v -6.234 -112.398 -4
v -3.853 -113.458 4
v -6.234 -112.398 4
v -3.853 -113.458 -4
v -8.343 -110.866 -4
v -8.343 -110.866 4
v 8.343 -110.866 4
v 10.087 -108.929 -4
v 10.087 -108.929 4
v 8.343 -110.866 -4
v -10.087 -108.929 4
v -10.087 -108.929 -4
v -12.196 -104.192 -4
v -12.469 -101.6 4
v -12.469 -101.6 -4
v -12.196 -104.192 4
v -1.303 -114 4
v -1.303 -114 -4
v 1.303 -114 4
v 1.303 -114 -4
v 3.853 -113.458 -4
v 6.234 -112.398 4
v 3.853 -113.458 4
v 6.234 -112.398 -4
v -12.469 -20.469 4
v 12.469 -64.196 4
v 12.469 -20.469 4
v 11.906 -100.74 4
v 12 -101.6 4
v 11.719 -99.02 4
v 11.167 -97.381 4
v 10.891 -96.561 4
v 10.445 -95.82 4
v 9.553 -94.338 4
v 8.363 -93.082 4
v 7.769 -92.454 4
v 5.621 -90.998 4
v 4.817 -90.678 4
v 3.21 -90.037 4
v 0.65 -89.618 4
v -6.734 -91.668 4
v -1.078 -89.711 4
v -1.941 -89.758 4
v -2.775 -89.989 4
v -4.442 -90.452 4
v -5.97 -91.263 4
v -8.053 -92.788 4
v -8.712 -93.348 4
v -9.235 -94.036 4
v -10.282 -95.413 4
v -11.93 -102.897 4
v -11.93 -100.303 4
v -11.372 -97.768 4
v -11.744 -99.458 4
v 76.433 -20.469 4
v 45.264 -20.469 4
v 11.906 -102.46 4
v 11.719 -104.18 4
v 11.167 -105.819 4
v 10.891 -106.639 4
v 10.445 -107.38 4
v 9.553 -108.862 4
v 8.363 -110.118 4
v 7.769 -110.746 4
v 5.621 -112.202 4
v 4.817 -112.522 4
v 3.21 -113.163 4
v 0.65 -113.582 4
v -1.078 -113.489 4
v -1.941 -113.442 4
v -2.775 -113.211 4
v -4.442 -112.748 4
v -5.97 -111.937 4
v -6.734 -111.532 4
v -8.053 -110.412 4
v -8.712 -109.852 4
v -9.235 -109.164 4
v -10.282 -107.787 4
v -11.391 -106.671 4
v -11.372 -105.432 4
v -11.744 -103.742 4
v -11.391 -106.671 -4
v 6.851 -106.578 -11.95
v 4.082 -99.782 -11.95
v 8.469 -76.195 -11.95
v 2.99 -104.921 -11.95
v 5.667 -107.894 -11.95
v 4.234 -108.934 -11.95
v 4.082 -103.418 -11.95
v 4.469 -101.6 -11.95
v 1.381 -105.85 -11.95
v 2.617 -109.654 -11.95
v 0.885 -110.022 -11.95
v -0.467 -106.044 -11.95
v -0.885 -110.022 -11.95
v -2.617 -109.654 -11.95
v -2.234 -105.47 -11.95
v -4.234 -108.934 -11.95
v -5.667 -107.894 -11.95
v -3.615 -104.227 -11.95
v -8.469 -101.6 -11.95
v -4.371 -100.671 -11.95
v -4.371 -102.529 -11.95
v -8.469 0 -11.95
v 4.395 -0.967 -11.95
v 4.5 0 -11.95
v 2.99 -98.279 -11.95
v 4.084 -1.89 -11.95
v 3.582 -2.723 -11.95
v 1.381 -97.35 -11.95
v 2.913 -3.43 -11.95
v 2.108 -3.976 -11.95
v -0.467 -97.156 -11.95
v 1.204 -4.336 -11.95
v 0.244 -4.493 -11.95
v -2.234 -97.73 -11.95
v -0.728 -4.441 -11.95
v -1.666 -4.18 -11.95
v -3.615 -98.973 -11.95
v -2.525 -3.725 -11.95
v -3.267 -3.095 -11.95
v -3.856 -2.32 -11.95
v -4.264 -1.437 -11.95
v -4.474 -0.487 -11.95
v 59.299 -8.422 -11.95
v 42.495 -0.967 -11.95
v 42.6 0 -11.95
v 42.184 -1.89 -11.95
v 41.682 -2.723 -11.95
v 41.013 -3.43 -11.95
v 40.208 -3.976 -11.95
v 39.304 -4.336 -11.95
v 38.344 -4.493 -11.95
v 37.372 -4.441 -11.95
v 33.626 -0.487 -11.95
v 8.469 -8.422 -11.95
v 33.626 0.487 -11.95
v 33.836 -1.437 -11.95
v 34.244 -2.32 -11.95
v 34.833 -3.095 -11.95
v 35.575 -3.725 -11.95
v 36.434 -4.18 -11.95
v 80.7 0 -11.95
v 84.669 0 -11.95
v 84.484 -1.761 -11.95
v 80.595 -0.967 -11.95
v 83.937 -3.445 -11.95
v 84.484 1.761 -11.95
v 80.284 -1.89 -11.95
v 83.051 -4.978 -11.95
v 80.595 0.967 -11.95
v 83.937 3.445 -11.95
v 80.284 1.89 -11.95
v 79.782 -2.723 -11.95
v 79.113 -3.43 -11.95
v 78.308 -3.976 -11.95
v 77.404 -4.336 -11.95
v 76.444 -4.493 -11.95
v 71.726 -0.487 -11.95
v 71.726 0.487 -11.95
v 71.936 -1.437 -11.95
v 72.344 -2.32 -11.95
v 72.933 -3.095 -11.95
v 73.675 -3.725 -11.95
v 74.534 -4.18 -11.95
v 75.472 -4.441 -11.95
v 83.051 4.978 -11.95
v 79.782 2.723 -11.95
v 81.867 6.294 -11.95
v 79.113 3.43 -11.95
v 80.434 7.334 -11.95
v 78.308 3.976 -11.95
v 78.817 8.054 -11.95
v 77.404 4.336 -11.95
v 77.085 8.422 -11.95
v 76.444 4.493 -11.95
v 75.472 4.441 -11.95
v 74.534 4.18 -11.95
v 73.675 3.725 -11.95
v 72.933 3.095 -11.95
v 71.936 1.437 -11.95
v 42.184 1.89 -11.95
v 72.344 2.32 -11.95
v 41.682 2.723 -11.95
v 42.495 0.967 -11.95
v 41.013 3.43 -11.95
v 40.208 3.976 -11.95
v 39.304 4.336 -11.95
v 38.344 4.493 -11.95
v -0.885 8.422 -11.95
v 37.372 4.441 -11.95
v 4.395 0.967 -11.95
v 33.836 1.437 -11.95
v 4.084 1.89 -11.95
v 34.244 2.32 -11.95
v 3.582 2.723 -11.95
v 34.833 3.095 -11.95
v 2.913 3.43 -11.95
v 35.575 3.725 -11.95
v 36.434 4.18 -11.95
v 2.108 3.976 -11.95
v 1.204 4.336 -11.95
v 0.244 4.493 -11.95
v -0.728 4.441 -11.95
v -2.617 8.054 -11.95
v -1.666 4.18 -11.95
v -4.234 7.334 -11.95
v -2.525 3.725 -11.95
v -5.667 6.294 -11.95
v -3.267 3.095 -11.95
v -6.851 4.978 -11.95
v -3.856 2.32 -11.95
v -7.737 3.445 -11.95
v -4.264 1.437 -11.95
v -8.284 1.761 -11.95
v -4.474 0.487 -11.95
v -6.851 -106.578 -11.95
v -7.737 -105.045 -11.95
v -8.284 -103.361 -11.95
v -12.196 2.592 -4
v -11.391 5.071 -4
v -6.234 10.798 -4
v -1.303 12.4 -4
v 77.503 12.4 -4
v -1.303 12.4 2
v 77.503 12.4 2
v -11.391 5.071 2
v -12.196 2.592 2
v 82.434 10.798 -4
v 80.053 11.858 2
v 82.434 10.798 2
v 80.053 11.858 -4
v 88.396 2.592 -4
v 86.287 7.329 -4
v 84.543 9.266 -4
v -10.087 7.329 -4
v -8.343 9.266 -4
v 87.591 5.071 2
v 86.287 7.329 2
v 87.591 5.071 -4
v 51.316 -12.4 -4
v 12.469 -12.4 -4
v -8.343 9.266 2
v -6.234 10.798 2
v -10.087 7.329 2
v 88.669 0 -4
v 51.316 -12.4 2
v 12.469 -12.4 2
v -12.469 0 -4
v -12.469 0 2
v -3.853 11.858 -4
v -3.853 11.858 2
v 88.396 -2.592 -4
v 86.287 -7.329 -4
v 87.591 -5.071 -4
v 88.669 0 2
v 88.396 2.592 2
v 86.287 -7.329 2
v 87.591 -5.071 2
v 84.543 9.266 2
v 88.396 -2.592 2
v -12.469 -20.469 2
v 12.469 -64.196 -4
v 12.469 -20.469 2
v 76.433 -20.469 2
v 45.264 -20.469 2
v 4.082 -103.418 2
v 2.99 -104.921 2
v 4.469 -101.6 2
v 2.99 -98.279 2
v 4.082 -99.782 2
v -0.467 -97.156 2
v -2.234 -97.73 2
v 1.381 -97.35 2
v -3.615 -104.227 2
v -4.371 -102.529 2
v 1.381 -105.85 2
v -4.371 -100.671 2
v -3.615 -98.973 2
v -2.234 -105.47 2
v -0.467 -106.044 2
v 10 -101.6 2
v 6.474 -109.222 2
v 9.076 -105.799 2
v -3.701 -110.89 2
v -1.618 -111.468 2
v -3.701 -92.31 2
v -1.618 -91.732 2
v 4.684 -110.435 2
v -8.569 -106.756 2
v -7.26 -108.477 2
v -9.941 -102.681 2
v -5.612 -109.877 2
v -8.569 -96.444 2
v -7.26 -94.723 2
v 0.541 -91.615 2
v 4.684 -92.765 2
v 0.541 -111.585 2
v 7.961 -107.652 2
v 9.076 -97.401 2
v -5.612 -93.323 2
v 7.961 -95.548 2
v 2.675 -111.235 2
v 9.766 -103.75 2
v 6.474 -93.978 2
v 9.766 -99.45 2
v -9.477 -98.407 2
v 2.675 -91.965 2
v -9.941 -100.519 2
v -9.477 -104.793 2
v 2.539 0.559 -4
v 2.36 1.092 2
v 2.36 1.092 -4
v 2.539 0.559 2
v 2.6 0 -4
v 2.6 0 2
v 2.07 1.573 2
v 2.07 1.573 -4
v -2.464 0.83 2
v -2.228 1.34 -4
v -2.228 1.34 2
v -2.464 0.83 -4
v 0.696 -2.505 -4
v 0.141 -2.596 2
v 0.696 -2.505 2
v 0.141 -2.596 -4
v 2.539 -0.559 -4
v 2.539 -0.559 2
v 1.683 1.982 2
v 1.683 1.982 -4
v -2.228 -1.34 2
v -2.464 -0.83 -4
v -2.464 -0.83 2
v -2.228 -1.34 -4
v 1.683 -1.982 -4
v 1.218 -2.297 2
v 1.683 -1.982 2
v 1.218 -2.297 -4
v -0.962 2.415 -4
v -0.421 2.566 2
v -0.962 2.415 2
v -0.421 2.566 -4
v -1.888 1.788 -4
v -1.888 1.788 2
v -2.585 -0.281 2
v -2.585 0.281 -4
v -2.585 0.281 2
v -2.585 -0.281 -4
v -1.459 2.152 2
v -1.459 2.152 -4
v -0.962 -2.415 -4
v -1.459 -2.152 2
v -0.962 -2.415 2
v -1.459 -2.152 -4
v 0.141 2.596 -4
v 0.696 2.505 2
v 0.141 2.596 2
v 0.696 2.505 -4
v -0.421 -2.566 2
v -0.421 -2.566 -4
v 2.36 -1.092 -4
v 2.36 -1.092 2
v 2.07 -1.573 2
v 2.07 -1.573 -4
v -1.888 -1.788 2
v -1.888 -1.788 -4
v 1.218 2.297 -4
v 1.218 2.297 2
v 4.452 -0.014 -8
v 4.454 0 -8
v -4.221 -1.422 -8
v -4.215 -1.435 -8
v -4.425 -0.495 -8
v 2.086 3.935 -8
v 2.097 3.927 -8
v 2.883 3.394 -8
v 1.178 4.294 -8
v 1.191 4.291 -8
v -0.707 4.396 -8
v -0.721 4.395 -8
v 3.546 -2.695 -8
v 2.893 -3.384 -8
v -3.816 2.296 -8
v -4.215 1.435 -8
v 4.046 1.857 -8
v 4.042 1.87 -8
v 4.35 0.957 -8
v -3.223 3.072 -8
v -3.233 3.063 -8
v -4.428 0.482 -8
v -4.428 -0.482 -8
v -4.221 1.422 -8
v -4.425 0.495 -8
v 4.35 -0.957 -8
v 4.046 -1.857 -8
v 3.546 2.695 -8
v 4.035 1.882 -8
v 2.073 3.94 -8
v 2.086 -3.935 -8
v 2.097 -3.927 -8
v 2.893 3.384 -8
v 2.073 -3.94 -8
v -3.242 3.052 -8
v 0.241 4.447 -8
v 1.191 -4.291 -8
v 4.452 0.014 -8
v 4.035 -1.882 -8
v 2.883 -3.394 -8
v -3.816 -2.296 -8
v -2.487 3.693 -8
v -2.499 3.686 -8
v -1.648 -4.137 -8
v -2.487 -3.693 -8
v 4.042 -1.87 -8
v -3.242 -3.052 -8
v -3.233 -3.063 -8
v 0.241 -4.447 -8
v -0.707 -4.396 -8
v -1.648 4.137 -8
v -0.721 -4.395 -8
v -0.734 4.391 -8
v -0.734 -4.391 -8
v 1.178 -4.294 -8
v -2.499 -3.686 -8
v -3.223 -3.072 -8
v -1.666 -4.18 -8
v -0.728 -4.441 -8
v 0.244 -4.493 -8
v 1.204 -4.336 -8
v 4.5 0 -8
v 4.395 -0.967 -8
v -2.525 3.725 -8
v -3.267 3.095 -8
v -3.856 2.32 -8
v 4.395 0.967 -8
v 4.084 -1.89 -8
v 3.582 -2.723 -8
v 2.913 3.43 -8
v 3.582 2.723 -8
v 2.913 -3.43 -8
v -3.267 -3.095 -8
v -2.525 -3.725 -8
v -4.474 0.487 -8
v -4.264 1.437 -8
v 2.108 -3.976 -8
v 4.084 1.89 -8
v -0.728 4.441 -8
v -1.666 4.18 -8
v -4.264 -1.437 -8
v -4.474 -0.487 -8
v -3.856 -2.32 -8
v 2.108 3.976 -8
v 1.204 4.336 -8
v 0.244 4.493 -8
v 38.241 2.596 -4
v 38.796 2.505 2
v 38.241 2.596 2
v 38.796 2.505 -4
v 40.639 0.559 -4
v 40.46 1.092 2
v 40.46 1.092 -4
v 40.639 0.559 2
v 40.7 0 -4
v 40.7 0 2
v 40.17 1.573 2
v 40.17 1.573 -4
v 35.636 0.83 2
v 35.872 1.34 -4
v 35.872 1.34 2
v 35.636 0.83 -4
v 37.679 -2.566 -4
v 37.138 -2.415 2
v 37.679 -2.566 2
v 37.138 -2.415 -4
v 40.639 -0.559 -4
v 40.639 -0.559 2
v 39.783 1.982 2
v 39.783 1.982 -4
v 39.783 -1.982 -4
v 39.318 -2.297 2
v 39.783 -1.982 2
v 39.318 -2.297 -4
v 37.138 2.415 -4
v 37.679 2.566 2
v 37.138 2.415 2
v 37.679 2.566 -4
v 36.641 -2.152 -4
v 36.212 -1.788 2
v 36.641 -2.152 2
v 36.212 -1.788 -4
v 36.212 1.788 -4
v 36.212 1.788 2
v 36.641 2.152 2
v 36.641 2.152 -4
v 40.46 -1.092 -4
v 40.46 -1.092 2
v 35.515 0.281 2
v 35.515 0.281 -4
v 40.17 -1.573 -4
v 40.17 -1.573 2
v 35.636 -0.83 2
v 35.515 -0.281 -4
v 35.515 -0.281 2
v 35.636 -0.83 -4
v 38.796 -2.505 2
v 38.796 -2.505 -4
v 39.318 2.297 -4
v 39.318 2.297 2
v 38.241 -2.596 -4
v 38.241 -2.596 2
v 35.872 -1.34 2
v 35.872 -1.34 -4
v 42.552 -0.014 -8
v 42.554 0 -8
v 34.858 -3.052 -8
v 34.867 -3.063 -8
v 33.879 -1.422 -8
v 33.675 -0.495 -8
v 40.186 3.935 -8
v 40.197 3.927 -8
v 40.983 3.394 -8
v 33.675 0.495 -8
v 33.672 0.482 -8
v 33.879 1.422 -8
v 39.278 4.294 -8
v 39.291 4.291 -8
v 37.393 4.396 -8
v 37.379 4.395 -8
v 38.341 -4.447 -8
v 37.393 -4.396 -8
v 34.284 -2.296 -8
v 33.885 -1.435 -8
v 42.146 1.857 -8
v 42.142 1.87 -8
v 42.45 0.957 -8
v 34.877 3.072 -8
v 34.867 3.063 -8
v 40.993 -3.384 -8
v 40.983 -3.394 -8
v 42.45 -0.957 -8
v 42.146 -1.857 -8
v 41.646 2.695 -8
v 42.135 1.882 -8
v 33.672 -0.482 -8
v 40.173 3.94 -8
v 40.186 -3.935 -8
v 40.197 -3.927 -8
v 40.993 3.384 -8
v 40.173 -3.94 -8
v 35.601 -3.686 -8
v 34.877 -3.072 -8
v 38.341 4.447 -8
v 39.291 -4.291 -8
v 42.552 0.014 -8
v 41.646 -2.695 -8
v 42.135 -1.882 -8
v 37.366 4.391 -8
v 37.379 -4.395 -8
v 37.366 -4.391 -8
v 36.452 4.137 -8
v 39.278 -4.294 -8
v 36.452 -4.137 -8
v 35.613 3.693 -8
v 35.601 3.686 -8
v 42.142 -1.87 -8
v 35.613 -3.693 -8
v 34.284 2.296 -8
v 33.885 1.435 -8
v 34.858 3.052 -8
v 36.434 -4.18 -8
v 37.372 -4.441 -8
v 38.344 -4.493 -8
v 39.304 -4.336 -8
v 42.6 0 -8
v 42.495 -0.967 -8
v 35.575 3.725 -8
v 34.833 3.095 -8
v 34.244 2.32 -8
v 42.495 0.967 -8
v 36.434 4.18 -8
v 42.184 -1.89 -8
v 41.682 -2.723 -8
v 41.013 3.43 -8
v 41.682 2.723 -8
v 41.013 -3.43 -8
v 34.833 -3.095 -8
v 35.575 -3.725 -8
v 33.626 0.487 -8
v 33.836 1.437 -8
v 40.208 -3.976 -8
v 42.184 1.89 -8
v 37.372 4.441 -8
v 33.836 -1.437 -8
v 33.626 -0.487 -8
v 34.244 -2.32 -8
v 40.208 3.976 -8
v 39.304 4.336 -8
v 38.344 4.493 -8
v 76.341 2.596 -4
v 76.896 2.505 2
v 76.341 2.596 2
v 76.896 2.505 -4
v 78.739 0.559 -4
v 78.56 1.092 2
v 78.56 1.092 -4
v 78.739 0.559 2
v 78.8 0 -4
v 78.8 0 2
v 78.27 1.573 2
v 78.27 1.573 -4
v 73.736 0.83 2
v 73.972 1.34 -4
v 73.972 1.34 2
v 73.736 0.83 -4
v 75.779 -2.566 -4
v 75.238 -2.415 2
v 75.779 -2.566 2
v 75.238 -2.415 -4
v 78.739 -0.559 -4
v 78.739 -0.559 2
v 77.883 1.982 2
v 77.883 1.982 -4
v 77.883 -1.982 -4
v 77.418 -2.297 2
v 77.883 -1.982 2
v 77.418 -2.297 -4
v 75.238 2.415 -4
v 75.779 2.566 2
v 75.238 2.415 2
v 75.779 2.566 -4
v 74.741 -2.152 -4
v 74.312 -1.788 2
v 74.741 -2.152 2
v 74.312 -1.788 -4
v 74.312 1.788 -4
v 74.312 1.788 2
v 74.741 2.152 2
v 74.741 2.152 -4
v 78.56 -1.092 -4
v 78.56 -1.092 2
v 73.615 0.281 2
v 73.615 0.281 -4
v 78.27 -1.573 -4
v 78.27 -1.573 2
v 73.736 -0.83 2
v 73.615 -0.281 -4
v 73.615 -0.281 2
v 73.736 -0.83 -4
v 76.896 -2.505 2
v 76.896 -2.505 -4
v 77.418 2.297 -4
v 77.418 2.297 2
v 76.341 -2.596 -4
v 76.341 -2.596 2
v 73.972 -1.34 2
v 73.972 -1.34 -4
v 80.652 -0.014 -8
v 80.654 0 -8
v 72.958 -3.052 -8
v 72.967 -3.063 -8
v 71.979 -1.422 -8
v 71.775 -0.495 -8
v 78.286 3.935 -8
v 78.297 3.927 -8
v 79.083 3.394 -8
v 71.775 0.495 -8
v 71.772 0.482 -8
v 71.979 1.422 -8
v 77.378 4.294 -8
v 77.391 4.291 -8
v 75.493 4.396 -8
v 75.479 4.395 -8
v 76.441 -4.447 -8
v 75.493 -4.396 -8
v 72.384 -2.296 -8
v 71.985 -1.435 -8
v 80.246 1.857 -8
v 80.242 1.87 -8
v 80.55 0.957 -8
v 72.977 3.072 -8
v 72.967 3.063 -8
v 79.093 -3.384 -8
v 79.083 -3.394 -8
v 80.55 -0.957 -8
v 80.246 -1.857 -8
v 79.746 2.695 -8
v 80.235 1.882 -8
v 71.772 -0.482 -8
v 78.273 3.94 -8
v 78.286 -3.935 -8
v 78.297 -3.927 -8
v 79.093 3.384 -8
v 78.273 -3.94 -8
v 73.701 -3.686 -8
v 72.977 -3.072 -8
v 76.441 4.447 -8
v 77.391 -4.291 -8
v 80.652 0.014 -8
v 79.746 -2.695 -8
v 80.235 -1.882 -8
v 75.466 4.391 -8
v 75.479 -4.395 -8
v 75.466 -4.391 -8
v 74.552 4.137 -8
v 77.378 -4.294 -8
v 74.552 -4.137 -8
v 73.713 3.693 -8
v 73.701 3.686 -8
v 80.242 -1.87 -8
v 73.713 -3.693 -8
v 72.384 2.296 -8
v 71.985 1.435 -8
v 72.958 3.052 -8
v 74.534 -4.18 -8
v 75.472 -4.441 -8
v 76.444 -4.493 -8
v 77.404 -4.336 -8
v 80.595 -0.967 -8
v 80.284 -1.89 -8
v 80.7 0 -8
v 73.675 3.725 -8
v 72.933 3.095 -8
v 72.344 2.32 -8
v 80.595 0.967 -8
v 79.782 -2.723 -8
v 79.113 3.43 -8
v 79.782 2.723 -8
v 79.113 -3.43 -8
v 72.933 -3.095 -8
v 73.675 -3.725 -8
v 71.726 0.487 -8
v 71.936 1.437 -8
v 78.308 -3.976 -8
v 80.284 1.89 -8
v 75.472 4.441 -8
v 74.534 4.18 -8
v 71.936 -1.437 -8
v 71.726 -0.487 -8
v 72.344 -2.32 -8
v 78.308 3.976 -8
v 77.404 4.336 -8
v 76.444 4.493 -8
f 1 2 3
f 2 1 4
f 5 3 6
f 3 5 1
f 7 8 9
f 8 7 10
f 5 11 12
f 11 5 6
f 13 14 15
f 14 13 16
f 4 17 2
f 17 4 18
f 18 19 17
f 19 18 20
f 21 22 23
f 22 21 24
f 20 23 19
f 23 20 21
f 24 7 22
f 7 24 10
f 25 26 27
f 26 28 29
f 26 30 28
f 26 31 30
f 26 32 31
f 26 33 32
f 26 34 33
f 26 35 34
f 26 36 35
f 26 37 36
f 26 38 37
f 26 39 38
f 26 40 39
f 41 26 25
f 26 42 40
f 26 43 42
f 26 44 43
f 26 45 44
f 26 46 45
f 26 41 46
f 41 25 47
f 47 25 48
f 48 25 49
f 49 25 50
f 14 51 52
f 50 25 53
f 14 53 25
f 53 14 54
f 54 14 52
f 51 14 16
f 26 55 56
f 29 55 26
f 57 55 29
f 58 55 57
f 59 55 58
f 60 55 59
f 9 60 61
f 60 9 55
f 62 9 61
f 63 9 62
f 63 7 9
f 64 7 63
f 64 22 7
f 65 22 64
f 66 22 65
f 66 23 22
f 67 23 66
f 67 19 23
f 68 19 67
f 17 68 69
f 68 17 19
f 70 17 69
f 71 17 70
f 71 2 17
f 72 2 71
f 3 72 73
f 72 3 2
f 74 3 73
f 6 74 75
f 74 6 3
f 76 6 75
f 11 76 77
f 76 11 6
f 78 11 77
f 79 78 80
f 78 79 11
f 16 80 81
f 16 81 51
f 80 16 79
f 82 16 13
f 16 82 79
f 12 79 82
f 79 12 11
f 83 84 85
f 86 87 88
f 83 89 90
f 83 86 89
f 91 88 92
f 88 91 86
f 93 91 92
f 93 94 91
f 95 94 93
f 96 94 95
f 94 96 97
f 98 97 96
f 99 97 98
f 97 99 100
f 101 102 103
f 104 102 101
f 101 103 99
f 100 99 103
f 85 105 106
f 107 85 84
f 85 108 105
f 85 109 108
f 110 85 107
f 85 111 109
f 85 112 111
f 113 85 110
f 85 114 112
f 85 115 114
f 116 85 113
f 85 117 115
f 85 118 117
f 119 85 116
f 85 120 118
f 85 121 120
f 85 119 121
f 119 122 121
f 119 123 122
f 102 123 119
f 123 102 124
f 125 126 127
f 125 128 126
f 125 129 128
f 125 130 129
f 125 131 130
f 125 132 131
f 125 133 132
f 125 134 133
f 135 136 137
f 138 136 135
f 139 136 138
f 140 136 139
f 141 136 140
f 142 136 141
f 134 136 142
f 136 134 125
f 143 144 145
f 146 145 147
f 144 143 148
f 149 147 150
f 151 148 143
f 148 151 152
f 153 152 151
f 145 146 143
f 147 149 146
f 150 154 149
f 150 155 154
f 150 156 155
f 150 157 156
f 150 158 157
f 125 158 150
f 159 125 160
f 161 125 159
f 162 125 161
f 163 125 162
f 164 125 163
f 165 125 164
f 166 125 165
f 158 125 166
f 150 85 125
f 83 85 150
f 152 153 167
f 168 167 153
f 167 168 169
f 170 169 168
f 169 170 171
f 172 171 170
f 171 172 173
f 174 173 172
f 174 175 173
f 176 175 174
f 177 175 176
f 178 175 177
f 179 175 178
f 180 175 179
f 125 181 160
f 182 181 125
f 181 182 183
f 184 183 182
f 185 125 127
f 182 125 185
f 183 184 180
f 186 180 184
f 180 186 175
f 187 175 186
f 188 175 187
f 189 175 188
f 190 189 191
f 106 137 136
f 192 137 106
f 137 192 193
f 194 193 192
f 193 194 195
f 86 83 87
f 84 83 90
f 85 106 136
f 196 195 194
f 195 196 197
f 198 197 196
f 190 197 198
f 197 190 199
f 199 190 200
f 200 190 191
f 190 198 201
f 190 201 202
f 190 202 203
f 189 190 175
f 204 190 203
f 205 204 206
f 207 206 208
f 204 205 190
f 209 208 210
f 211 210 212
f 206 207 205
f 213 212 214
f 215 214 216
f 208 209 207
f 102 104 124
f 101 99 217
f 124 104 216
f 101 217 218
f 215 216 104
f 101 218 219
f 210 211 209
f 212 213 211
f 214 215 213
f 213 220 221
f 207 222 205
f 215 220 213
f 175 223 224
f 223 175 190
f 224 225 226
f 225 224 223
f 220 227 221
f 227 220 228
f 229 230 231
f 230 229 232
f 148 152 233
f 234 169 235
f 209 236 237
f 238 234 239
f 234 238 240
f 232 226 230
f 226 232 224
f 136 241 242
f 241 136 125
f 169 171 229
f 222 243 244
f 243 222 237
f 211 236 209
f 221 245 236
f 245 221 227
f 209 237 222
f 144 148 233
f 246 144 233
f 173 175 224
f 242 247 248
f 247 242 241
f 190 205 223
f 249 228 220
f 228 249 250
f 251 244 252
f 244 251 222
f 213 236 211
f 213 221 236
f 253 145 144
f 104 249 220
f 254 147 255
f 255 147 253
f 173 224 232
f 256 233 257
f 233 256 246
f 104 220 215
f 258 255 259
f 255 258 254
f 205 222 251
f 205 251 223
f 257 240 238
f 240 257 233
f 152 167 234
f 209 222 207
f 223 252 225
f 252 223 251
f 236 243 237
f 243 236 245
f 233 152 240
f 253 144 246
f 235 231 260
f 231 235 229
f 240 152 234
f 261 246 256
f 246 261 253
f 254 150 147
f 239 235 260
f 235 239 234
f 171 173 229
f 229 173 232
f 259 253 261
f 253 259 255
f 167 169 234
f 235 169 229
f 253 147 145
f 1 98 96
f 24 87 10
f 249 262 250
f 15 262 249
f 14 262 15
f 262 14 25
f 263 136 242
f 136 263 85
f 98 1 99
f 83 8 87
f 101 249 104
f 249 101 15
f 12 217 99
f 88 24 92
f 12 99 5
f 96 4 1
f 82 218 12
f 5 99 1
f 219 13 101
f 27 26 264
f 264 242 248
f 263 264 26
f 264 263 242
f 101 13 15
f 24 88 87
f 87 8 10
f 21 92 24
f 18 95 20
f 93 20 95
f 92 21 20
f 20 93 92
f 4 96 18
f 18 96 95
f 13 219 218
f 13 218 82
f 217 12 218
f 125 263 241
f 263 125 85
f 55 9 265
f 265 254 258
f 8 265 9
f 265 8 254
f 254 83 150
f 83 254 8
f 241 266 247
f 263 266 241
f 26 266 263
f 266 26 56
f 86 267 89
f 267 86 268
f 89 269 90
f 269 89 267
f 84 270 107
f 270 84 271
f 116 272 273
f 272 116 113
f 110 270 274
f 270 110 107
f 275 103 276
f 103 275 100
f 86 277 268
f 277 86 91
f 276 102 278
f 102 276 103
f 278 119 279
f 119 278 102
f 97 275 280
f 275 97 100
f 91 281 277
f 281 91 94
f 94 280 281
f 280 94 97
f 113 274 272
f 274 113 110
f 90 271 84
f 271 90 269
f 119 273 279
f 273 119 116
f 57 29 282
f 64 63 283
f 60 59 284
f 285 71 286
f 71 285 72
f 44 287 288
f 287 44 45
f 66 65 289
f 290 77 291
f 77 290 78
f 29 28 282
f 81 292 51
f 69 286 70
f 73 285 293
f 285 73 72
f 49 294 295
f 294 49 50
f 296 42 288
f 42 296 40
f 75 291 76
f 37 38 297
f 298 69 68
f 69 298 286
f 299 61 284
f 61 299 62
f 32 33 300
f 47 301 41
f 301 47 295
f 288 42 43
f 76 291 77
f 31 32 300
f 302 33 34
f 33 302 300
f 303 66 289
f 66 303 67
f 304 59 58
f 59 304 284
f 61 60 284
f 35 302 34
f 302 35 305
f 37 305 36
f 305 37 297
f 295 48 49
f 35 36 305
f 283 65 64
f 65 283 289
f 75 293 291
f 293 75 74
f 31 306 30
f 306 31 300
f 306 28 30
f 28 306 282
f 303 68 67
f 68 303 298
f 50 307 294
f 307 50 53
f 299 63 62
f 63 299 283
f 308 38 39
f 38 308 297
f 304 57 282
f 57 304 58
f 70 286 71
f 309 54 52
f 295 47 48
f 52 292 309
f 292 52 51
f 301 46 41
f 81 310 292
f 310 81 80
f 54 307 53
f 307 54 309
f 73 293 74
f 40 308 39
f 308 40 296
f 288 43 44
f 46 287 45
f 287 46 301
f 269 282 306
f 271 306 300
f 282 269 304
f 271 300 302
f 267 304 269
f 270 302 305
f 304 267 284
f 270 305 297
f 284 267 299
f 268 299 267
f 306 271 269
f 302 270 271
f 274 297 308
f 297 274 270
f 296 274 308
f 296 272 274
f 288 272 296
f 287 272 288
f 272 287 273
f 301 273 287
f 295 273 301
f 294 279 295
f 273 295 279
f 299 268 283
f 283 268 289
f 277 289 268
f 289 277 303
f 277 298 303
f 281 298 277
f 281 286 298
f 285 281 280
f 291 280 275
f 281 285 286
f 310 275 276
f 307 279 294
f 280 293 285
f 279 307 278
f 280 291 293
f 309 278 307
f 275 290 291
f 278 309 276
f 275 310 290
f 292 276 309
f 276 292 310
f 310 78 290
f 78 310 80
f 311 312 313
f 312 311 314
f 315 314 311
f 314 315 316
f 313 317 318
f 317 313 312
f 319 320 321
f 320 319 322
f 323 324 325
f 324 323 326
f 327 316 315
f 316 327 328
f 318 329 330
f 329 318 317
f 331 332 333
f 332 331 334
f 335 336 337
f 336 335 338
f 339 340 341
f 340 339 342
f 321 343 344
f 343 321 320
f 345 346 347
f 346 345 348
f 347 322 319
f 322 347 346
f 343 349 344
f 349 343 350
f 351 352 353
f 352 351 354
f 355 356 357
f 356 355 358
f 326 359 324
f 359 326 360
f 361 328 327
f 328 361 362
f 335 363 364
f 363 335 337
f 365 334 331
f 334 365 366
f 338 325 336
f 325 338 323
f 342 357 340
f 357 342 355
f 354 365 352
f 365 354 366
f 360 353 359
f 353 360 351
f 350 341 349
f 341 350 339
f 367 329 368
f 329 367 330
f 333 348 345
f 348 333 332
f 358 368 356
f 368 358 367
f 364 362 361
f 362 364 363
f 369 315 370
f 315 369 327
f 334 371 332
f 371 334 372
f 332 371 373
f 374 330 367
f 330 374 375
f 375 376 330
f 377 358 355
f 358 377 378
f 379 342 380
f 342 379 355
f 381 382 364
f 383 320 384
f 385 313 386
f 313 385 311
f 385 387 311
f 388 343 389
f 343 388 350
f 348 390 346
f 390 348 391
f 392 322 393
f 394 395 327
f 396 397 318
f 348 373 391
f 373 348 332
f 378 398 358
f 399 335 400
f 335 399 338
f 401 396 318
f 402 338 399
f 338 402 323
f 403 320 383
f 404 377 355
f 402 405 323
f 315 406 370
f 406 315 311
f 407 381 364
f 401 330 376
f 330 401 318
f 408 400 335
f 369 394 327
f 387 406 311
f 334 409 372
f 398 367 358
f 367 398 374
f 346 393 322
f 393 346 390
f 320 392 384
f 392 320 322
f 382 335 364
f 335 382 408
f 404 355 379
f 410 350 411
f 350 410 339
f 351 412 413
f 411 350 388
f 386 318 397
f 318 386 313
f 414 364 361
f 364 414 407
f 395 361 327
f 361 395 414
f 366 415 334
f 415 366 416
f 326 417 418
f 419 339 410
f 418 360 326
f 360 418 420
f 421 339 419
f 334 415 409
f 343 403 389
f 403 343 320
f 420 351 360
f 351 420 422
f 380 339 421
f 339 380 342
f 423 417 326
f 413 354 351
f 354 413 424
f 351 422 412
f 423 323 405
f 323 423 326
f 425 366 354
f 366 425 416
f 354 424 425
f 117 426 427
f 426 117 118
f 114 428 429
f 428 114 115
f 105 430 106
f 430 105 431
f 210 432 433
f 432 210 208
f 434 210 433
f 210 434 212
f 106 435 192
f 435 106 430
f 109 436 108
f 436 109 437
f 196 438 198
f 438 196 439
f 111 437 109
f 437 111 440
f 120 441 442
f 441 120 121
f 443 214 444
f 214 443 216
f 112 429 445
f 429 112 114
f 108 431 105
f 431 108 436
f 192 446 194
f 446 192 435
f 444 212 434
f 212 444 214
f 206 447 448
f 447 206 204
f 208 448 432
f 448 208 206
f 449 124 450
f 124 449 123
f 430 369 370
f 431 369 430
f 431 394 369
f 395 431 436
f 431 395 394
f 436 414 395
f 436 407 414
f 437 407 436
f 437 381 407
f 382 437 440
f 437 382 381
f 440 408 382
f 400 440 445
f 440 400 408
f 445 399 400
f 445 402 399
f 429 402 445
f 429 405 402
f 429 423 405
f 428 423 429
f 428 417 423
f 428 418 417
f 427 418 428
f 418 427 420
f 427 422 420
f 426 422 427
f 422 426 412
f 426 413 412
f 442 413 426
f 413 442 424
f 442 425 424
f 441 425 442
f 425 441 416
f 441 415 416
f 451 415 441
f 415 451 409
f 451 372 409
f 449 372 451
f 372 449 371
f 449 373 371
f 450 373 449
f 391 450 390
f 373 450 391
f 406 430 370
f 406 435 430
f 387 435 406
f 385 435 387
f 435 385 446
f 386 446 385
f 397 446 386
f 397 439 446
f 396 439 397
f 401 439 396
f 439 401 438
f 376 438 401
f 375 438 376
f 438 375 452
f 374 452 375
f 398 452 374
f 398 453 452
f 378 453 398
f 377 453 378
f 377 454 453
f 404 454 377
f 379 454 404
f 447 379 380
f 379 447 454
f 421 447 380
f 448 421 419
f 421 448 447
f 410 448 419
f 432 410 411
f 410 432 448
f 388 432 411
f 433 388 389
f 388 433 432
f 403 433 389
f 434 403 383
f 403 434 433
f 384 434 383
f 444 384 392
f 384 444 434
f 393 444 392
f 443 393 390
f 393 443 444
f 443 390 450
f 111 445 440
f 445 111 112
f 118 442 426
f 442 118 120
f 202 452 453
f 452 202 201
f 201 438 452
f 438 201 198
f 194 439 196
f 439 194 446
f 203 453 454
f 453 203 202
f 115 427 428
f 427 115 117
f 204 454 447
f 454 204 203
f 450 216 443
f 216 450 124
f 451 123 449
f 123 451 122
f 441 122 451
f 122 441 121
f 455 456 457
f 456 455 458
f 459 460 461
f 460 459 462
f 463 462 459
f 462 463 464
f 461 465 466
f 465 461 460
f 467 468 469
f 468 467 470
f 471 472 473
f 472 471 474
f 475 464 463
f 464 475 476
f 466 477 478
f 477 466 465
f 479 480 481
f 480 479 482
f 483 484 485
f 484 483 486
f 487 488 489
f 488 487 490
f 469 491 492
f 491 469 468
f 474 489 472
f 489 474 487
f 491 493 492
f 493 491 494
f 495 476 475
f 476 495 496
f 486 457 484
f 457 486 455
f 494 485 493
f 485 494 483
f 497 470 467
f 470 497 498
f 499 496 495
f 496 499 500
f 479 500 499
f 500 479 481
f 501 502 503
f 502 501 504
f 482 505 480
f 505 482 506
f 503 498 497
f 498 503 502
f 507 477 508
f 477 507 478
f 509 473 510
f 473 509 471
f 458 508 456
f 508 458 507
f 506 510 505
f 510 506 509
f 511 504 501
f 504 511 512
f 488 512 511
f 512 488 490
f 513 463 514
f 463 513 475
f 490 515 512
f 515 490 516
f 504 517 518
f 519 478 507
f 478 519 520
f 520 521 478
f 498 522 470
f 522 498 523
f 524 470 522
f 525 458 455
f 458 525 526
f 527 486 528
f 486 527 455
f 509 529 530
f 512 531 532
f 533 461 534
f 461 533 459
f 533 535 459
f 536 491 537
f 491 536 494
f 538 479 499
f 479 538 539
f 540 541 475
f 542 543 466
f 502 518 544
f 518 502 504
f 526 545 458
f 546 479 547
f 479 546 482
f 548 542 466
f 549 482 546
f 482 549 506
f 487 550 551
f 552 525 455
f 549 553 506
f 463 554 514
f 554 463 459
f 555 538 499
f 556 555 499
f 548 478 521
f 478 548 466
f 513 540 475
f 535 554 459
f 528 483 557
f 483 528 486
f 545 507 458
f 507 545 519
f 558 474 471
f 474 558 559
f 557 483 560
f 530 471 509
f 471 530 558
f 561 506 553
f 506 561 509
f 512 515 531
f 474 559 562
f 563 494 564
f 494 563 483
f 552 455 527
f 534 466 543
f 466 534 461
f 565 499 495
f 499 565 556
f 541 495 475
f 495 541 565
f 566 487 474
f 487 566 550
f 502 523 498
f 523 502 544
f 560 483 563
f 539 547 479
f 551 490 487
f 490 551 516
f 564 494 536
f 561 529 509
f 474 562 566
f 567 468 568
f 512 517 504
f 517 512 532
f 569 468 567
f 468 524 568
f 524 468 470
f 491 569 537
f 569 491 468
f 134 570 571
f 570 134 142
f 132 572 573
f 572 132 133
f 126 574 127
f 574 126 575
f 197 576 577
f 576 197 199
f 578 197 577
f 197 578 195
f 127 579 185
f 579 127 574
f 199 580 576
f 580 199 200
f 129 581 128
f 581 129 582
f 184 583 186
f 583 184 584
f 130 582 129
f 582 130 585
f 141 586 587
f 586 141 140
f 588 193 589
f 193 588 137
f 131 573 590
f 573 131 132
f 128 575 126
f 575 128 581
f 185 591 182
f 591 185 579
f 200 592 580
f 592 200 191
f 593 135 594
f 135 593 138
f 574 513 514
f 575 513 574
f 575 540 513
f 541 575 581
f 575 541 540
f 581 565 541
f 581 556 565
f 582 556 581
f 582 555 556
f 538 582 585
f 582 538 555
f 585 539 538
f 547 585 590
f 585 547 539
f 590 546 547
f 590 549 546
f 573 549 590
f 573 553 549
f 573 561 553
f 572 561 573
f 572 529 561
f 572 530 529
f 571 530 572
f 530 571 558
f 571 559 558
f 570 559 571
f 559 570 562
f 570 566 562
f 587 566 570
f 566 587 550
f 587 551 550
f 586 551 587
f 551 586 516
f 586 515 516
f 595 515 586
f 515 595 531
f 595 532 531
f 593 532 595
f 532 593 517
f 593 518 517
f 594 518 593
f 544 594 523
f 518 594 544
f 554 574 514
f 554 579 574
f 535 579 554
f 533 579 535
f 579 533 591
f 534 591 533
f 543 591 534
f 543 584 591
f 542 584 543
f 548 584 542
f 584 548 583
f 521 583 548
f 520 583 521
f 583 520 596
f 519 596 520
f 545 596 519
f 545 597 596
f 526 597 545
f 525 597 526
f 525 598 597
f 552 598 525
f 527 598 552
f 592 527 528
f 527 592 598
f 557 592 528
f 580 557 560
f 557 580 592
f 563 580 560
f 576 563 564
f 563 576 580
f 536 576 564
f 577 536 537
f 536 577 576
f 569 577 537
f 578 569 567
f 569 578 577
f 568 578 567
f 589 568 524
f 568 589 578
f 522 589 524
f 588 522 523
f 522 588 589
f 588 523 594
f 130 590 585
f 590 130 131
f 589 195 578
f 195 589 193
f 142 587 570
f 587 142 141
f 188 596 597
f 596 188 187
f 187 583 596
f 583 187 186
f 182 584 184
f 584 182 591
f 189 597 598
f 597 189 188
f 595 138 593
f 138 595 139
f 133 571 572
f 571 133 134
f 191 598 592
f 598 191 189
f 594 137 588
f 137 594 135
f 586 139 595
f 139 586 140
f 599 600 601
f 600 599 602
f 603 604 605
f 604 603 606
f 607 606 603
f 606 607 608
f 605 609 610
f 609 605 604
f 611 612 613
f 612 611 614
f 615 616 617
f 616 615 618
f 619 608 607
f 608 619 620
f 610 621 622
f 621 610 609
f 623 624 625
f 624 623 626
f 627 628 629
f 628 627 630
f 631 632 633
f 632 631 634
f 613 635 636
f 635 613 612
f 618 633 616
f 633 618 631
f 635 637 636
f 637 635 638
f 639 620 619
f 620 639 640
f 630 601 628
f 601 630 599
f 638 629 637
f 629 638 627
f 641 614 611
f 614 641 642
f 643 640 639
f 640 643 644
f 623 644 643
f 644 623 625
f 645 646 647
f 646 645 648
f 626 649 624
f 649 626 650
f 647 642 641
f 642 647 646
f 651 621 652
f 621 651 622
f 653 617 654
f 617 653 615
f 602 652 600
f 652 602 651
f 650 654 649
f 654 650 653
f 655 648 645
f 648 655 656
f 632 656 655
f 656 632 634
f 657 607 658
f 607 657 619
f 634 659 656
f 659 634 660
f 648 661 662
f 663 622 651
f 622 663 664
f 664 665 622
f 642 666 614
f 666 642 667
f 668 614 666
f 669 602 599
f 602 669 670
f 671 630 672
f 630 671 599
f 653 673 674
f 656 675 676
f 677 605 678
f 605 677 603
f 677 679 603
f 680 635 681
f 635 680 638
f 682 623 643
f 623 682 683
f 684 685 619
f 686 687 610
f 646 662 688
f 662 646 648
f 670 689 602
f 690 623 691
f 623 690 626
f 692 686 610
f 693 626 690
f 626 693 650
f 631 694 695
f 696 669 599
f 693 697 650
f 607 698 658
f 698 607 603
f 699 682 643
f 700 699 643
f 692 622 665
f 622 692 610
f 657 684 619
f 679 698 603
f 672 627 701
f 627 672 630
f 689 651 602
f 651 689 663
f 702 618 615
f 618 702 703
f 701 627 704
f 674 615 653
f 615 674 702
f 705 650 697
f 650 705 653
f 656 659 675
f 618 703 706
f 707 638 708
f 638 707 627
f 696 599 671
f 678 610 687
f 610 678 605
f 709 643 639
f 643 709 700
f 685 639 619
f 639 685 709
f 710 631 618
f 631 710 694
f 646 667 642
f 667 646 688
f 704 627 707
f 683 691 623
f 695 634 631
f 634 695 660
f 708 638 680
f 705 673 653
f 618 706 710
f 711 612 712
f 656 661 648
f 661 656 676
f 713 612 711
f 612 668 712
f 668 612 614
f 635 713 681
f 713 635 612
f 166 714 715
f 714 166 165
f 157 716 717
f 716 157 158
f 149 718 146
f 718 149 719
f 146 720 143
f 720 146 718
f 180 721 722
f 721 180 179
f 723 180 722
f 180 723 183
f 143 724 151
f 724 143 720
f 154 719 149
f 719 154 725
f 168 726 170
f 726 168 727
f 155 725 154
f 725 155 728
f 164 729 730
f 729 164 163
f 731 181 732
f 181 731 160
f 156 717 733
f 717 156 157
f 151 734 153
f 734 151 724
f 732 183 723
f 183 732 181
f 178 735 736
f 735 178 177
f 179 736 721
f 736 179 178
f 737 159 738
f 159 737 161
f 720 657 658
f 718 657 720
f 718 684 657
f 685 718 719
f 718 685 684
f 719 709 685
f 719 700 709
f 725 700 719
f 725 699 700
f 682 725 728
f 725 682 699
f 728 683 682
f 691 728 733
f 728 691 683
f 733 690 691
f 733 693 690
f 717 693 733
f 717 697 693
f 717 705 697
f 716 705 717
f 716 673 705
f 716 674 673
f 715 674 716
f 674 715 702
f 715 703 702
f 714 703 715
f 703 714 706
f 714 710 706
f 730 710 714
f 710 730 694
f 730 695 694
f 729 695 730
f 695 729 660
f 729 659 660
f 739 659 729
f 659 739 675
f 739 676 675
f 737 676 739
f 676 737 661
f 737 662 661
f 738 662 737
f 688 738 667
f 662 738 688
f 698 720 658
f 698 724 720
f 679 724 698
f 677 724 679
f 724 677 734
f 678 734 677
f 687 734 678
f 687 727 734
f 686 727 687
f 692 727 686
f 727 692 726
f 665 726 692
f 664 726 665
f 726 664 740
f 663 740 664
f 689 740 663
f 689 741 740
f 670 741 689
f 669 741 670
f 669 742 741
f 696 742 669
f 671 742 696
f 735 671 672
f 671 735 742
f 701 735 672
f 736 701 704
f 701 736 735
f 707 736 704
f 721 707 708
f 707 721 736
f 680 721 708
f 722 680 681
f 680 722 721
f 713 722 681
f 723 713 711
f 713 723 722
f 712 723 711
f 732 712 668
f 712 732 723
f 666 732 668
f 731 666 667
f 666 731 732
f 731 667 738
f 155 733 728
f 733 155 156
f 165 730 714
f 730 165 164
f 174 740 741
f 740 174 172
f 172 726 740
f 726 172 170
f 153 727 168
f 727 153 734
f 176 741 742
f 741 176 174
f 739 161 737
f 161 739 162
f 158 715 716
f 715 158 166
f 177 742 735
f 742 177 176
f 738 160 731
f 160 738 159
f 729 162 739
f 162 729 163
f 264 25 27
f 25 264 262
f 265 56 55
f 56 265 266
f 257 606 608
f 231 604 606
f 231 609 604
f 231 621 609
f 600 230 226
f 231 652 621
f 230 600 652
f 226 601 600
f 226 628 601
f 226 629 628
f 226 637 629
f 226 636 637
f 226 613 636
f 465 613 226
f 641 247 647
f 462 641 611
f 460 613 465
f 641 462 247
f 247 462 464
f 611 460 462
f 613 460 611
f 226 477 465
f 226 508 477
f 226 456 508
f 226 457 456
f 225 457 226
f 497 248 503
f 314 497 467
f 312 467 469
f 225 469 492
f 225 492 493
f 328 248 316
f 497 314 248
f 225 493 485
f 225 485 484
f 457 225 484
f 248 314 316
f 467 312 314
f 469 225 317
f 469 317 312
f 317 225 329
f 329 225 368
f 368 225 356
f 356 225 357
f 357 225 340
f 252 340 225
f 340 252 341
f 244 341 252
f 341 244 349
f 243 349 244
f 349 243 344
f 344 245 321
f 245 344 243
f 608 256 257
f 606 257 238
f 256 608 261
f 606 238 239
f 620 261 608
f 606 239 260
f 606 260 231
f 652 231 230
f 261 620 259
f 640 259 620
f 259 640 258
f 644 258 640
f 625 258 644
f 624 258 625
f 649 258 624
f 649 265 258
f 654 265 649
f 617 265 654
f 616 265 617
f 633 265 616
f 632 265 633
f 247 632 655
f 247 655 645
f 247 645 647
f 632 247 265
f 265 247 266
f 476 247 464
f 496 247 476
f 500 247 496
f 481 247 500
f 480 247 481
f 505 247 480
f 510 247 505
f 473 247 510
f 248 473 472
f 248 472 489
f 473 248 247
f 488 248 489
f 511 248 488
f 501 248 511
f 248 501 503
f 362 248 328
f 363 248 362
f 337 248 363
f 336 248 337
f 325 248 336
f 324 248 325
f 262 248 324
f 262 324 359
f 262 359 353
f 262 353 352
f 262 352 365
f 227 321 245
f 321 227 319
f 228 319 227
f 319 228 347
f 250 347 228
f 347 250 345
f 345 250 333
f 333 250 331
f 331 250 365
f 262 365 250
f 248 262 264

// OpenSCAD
in = 25.4;

axle_rad = 5/16*in/2+.5;
axle_lift = 4*in;
length = 3*in;

wall = 8;
lip_inset = 2;


rotate([90,0,0]) boat_wheels();
//rotate([90,0,0]) mirror([1,0,0]) boat_wheels();


module boat_wheels(){
    difference(){
        union(){
            //axle
            translate([0,0,axle_lift]){
                rotate([90,0,0]) cylinder(r=axle_rad+wall, h=wall, center=true);
                rotate([90,0,0]) translate([0,0,wall-.1]) cylinder(r1=axle_rad+wall, r2=axle_rad+wall/2, h=wall+.1, center=true);
            }
            
            //attach bar
            hull(){
                rotate([90,0,0]) cylinder(r=axle_rad+wall, h=wall, center=true);
                rotate([90,0,0]) translate([0,0,wall-.1]) cylinder(r1=axle_rad+wall, r2=axle_rad+wall/2, h=wall+.1, center=true);
                
                translate([length,0,0]){
                    rotate([90,0,0]) cylinder(r=axle_rad+wall, h=wall, center=true);
                    rotate([90,0,0]) translate([0,0,wall-.1]) cylinder(r1=axle_rad+wall, r2=axle_rad+wall/2, h=wall+.1, center=true);
                }
            }
            
            //connect up the axle
            hull(){
                translate([0,0,axle_lift]){
                    rotate([90,0,0]) cylinder(r=axle_rad+wall, h=wall, center=true);
                    rotate([90,0,0]) translate([0,0,wall-.1]) cylinder(r1=axle_rad+wall, r2=axle_rad+wall/2, h=wall+.1, center=true);
                }
                
                rotate([90,0,0]) cylinder(r=axle_rad+wall, h=wall, center=true);
                rotate([90,0,0]) translate([0,0,wall-.1]) cylinder(r1=axle_rad+wall, r2=axle_rad+wall/2, h=wall+.1, center=true);
            }
            
            hull(){
                translate([0,0,axle_lift]){
                    rotate([90,0,0]) cylinder(r=axle_rad+wall, h=wall, center=true);
                    rotate([90,0,0]) translate([0,0,wall-.1]) cylinder(r1=axle_rad+wall, r2=axle_rad+wall/2, h=wall+.1, center=true);
                }
                
                translate([length,0,0]) {
                    rotate([90,0,0]) cylinder(r=axle_rad+wall, h=wall, center=true);
                    rotate([90,0,0]) translate([0,0,wall-.1]) cylinder(r1=axle_rad+wall, r2=axle_rad+wall/2, h=wall+.1, center=true);
                }
            }
        }
        
        //axle holder
        translate([0,0,axle_lift]){
            rotate([90,0,0]) cylinder(r=axle_rad, h=50, center=true);
            rotate([90,0,0]) translate([0,0,-wall*1.5]) cylinder(r2=10, r1=20, h=10, $fn=29);
        }
        
        //cut out to attach
        translate([0,wall/2+wall-lip_inset,0]) cube([500,wall*2,(axle_rad+wall*2)*2], center=true);
        
        //some screwholes
        for(i=[0:length/2:length]) translate([i,0,0]) {
            rotate([-90,0,0]) cylinder(r=2.6, h=50, center=true, $fn=29);
            rotate([90,0,0]) translate([0,0,wall/2]) cylinder(r1=2.6, r2=9/2, h=4.1, $fn=29);
            rotate([90,0,0]) translate([0,0,wall/2+4]) cylinder(r=9/2, h=10, $fn=29);
        }
    }
}
